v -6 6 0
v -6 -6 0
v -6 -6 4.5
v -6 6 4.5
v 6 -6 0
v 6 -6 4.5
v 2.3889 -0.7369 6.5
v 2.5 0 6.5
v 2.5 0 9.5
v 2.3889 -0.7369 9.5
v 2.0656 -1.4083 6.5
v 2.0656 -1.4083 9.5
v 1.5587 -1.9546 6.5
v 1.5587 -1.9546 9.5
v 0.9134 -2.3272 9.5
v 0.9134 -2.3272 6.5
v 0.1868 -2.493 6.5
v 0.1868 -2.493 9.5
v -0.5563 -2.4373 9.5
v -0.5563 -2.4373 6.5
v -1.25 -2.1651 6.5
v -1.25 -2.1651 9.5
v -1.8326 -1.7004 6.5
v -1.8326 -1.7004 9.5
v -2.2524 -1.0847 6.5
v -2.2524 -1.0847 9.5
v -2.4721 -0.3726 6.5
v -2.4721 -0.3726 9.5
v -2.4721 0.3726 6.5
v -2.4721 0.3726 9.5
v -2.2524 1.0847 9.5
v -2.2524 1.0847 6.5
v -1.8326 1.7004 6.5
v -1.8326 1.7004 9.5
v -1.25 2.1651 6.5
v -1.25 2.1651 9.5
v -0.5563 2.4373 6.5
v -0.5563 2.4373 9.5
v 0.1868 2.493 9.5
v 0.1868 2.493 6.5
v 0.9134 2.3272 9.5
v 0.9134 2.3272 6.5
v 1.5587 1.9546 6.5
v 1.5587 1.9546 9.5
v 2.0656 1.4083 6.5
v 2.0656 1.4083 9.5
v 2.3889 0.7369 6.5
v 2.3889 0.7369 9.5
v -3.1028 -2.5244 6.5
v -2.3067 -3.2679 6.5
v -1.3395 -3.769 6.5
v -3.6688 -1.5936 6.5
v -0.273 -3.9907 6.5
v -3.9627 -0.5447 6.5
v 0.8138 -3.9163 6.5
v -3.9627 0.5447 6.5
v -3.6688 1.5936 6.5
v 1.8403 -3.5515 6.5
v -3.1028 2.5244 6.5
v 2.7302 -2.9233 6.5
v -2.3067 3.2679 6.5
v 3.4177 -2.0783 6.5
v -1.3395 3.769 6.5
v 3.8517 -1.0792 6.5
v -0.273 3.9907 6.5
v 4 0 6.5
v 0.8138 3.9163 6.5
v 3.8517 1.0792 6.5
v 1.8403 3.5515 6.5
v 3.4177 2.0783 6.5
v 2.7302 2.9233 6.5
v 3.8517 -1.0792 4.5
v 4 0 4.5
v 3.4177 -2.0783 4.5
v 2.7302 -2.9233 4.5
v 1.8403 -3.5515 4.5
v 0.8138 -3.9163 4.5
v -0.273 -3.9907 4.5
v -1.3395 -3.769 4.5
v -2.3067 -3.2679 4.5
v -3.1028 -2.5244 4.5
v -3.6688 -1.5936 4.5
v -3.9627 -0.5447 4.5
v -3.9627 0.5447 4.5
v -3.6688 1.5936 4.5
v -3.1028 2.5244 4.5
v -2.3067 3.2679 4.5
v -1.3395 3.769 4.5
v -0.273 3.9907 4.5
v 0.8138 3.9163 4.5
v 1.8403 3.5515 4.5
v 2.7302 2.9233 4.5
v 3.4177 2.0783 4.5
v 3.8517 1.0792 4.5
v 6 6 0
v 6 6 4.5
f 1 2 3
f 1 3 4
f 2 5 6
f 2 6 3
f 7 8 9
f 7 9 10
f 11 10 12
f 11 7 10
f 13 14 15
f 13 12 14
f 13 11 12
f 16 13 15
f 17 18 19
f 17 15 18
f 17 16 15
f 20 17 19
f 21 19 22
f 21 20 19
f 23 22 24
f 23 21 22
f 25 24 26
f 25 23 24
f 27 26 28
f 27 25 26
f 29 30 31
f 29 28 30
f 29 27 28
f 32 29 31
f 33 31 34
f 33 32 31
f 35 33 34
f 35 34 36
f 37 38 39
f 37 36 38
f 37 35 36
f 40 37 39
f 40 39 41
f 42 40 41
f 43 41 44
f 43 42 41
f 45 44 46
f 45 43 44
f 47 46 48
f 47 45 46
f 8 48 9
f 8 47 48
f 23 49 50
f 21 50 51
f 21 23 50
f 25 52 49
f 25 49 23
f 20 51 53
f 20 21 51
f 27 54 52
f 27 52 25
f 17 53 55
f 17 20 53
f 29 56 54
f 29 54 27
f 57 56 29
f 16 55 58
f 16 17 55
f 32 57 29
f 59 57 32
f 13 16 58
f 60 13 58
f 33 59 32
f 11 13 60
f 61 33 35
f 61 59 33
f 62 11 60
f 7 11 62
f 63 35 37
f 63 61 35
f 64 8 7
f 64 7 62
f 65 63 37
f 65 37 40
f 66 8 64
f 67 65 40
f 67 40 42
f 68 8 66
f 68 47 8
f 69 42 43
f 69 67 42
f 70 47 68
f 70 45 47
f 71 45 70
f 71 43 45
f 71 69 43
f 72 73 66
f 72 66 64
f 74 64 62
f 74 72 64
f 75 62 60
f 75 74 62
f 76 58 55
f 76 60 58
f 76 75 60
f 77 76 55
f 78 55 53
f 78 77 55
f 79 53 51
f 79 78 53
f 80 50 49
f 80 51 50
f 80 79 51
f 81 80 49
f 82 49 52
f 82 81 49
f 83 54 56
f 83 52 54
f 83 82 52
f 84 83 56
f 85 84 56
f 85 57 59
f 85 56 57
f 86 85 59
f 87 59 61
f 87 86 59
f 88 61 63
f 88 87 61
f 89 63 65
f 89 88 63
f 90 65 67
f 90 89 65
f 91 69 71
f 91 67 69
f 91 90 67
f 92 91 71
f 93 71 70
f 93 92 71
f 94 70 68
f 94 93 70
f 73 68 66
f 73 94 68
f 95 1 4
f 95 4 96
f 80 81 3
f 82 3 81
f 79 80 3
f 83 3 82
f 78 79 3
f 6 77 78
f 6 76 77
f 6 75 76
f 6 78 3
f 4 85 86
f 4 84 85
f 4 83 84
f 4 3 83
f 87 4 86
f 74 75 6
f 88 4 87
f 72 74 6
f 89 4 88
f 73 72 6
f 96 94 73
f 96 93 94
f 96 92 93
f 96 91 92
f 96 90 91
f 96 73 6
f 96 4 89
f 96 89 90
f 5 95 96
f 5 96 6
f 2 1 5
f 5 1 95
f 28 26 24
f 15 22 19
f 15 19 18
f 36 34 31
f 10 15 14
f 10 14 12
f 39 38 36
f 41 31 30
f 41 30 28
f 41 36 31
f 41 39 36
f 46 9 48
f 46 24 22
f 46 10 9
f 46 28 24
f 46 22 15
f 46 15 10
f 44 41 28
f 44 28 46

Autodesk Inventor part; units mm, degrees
ref_plane "YZ Plane" through (0, 0, 0) normal (1, 0, 0) x (0, 1, 0)
ref_plane "XZ Plane" through (0, 0, 0) normal (0, 1, 0) x (-1, 0, 0)
ref_plane "XY Plane" through (0, 0, 0) normal (0, 0, 1) x (1, 0, 0)
sketch "スケッチ1" plane through (0, 0, 0) normal (0, 0, 1) x (1, 0, 0)
  line L0 (6, -6) -> (-6, -6)
  line L1 (-6, -6) -> (-6, 6)
  line L2 (-6, 6) -> (6, 6)
  line L3 (6, 6) -> (6, -6)
  line L4 (6, -6) -> (-6, 6) construction
  line L5 (-6, -6) -> (6, 6) construction
  point P0 (0, 0)
  dimension "d0" = 12
  dimension "d1" = 12
extrude "押し出し1" add sketch "スケッチ1" along normal blind 4.5
sketch "スケッチ2" plane through (0, 0, 4.5) normal (0, 0, 1) x (1, 0, 0)
  circle A0 centre (0, 0) radius 4
  dimension "d4" = 8
extrude "押し出し2" add sketch "スケッチ2" along normal blind 2
sketch "スケッチ3" plane through (0, 0, 6.5) normal (0, 0, 1) x (1, 0, 0)
  circle A0 centre (0, 0) radius 2.5
  dimension "d7" = 5
extrude "押し出し3" add sketch "スケッチ3" along normal blind 3
properties part number "switch"
